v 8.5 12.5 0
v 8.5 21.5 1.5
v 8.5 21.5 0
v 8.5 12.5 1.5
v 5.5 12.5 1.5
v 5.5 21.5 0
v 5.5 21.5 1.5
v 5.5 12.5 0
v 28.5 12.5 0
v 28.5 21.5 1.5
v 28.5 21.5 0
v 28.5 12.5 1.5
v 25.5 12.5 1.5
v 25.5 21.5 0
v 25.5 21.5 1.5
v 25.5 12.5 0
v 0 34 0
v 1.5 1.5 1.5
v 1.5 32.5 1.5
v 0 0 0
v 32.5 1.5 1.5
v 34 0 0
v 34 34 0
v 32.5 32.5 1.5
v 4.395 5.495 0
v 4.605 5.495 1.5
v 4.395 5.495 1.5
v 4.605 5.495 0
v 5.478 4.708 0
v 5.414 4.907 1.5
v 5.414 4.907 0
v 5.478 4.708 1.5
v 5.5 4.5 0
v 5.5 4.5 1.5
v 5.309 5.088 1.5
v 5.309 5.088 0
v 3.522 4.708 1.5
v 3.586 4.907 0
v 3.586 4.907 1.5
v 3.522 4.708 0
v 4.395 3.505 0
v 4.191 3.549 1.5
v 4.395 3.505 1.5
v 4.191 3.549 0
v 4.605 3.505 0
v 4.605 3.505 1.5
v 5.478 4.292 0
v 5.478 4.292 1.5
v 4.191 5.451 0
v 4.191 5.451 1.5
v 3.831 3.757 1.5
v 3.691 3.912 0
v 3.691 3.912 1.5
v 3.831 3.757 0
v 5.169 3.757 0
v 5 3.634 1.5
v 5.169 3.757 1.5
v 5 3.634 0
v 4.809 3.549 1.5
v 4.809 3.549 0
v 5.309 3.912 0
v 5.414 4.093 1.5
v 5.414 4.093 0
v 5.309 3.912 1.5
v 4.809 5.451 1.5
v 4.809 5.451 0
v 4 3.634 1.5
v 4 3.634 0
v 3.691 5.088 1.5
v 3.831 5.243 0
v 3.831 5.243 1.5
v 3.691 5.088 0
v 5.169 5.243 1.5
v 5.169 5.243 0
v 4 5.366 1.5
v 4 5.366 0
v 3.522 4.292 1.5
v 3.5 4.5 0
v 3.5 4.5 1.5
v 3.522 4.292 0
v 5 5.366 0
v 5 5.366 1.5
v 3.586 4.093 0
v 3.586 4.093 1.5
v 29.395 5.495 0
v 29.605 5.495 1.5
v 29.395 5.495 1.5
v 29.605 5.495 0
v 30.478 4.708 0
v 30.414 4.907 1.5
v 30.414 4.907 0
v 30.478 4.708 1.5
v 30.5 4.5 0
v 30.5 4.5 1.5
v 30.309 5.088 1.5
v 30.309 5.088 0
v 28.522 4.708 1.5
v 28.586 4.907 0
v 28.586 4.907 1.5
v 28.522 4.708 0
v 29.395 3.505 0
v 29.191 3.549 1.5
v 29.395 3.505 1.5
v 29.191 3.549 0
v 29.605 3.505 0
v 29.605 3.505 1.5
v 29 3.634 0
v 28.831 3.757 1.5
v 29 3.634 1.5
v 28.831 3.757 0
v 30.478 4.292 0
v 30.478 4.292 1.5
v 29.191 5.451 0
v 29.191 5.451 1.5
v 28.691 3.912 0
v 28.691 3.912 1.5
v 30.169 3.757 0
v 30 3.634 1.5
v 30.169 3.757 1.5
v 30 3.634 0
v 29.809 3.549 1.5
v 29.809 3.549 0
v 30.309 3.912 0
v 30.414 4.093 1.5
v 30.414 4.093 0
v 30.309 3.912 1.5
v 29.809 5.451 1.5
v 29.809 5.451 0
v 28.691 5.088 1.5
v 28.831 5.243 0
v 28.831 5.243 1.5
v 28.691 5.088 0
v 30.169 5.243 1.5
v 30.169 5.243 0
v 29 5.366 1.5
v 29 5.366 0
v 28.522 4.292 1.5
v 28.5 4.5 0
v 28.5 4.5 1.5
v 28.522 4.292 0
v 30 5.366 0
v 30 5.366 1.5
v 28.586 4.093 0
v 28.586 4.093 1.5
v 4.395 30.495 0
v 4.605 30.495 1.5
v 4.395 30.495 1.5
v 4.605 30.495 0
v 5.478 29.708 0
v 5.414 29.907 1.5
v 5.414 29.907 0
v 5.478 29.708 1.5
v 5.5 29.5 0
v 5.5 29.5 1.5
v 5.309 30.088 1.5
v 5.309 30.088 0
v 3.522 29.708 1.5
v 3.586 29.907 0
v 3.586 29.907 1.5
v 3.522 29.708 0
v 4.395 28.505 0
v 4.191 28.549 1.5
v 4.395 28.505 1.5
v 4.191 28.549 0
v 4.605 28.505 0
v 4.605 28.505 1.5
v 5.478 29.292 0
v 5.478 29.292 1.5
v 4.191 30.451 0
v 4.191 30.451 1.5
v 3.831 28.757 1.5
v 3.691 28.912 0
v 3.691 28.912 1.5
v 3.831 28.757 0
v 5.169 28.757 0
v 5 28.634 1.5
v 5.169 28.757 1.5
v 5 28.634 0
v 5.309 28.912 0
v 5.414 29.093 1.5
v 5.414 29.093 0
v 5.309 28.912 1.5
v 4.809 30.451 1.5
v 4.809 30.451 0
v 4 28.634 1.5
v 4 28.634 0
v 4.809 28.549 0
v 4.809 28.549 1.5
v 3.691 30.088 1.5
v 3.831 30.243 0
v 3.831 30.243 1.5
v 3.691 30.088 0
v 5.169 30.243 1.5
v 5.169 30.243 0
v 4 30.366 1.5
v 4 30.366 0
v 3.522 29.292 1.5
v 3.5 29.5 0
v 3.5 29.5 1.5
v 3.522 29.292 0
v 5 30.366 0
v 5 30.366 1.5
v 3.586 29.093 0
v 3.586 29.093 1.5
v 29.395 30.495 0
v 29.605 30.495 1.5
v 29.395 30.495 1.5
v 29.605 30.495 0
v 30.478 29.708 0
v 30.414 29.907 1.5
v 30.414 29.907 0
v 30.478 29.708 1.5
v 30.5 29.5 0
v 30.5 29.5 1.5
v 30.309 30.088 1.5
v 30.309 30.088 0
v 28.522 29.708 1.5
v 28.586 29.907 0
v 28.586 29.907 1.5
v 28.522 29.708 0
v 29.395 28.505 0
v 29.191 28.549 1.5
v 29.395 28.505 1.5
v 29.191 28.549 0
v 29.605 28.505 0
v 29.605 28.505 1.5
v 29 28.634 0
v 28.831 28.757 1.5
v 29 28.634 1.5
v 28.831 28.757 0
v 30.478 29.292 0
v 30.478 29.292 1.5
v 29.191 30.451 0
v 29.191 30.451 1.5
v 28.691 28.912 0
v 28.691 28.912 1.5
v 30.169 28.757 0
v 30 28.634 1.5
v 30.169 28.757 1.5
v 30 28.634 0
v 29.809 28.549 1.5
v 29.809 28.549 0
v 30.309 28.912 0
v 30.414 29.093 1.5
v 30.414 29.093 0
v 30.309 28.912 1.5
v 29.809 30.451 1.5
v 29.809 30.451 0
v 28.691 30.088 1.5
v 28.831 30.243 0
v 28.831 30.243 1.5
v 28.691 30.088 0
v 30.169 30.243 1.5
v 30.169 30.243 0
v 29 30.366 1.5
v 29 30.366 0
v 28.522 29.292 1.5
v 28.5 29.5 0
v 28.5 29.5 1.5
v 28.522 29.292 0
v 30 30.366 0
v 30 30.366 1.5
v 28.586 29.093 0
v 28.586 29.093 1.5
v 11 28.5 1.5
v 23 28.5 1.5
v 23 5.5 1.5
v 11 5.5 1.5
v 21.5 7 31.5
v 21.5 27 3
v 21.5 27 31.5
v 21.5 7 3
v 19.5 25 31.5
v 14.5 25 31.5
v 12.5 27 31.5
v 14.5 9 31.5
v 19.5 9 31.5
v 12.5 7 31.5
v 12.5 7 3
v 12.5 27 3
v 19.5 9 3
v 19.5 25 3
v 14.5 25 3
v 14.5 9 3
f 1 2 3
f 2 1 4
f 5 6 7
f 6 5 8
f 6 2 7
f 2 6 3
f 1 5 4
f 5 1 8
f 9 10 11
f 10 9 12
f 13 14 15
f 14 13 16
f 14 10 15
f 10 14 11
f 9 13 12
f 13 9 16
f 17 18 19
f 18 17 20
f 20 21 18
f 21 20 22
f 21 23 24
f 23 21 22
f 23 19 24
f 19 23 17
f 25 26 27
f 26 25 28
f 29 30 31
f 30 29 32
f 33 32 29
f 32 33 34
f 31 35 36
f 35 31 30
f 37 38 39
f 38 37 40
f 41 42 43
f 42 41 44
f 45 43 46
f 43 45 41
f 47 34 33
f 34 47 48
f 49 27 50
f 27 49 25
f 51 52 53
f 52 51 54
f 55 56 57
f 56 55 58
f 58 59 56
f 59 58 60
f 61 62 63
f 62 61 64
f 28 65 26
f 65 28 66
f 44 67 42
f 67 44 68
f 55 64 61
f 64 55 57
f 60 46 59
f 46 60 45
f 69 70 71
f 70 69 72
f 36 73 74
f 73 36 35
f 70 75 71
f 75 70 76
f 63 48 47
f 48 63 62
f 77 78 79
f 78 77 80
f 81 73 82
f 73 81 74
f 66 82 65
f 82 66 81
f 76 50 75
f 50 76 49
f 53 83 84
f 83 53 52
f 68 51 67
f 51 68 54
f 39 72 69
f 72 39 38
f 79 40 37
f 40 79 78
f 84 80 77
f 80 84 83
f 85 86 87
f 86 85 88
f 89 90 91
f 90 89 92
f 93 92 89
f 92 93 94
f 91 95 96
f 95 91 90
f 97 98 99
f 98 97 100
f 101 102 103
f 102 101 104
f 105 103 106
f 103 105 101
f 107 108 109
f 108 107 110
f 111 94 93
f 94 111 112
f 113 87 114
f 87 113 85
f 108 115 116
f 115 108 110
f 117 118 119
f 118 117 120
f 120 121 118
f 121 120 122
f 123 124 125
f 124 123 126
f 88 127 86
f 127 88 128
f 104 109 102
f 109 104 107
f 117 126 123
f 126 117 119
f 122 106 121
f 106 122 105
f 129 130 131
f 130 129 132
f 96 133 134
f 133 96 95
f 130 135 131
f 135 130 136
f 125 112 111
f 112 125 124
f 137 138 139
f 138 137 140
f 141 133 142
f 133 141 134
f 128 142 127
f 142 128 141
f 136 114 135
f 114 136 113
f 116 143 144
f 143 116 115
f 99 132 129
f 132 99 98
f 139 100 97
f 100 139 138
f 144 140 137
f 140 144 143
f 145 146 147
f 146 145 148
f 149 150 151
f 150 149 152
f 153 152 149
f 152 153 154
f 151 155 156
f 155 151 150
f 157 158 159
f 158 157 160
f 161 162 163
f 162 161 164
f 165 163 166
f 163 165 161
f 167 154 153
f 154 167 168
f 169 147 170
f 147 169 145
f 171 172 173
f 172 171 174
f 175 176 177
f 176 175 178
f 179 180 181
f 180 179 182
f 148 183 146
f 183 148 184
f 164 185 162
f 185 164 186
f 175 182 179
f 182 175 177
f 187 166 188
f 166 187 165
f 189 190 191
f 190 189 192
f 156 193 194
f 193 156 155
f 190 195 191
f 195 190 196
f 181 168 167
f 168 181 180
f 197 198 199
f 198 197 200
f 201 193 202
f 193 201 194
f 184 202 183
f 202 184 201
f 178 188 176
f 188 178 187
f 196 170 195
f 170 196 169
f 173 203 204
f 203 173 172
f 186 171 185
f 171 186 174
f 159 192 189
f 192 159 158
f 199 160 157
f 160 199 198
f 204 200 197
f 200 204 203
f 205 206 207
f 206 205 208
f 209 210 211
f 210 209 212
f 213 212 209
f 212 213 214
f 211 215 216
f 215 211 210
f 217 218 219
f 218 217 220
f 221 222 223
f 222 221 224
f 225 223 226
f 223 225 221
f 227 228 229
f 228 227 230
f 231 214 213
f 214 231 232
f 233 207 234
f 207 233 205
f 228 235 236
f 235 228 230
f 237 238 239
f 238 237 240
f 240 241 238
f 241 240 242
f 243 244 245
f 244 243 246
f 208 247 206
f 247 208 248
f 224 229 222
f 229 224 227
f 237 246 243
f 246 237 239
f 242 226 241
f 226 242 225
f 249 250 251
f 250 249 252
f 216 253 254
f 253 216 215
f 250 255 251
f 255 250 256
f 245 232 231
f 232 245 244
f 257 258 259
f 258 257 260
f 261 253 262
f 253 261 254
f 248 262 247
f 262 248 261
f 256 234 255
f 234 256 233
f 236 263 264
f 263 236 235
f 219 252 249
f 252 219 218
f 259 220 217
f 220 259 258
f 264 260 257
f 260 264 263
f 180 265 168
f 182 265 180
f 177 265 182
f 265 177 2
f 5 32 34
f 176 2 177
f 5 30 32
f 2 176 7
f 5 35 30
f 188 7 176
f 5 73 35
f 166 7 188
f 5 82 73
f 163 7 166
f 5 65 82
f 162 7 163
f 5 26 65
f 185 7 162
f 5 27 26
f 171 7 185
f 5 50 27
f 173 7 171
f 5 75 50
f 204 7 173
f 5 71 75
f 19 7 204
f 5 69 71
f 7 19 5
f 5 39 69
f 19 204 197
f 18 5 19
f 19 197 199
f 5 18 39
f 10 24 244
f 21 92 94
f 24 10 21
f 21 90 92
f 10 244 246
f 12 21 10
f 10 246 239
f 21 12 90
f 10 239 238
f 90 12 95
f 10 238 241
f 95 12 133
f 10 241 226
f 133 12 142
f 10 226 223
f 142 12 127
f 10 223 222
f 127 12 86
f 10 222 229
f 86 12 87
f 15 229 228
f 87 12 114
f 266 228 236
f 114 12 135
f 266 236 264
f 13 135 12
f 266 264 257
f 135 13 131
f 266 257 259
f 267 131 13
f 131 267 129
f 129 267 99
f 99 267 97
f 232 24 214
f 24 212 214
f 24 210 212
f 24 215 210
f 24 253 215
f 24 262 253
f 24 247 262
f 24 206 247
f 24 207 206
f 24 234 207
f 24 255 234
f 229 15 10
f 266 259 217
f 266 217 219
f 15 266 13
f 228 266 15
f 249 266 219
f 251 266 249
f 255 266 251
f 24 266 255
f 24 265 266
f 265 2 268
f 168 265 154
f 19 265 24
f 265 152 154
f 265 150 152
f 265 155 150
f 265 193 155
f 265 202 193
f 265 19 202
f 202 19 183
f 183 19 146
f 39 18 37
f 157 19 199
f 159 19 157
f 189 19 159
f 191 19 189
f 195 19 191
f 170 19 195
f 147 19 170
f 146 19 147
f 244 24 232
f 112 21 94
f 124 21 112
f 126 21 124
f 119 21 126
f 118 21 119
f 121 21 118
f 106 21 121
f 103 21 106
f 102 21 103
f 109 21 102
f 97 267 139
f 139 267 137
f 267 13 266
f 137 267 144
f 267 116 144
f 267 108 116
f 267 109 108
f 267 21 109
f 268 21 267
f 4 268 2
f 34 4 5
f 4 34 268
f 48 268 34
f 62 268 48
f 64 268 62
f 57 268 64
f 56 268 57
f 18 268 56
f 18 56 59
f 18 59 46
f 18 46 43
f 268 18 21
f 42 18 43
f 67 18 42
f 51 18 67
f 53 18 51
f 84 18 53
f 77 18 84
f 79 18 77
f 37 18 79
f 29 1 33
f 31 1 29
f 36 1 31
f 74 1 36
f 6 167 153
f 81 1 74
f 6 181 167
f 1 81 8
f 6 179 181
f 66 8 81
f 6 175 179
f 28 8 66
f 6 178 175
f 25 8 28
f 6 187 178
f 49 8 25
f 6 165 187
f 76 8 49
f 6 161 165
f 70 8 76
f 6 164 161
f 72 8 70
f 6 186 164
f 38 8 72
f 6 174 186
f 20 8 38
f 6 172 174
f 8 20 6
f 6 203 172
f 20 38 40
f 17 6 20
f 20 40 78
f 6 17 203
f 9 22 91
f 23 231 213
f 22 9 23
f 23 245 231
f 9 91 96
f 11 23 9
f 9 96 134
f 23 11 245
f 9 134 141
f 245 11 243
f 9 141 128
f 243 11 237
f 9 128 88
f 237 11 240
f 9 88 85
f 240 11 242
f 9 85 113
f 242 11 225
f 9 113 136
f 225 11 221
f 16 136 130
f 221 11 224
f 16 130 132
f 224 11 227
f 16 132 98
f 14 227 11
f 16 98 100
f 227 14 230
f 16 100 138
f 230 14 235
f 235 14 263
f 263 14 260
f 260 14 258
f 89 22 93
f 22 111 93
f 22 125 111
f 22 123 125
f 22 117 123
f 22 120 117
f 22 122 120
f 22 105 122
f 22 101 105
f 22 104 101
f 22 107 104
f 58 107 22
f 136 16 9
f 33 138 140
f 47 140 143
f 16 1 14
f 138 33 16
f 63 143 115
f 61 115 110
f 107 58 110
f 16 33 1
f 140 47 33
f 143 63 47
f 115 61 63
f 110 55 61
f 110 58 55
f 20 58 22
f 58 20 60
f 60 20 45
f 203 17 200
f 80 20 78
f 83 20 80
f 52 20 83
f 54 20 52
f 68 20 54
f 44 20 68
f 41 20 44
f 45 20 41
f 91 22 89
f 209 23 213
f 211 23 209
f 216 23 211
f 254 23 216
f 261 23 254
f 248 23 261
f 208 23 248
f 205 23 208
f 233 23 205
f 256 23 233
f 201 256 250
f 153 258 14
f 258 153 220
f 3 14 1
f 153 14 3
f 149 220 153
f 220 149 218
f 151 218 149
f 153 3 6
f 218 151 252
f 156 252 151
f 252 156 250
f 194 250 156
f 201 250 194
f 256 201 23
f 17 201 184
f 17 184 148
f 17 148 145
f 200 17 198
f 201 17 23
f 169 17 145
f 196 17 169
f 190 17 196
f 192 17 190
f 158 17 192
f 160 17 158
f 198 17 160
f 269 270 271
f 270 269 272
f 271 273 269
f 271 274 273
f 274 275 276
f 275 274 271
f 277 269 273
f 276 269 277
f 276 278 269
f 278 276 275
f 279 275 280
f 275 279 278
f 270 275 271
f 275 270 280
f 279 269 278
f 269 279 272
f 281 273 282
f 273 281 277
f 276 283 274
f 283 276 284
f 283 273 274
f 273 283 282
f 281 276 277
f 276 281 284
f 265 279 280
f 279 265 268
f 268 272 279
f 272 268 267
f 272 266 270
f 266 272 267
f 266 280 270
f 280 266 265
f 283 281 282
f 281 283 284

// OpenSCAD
// title      : RoboGen parametric A part
// author     : Alice Concordel

partA(0.03,0); //the first parameter is the length of the joint, the second parameter is the angle beta (only for non-planar robots)

module partA(length, beta)
{
//plate parameters
	lengthSlide = 34;
	widthSlide = 34;
	heightSlide = 1.5;

	radiusHole = 1;

//wire hole parameters
	lengthWire = 3;
	widthWire = 9;
	heightWire = heightSlide;

//shaft part parameters
	lengthShaft = 20;
	widthShaft = 9;

// apply transformations to the parameter
length = length*1000; //convert to mm
	union()
	{
		difference()
		{
			// starting plate
			cube([lengthSlide,widthSlide,heightSlide]);
		
			union()
			{
			// chamfer the edges
				rotate ([0,-45,0]) cube([3,widthSlide,3]);
				rotate([45,0,0]) cube([lengthSlide,3,3]);
				translate([lengthSlide,0,0]) rotate([0,-45,0]) cube([3,widthSlide,3]);
				translate([0,widthSlide,0]) rotate([45,0,0]) cube([lengthSlide,3,3]);

			// holes in the plate
					//round
				translate([4.5,4.5,-0.5]) cylinder(r = radiusHole, h = heightSlide+1, $fn = 30);
				translate([lengthSlide-4.5,4.5,-0.5]) cylinder(r = radiusHole, h = heightSlide+1, $fn = 30);
				translate([4.5,widthSlide-4.5,-0.5]) cylinder(r = radiusHole, h = heightSlide+1, $fn = 30);
				translate([lengthSlide-4.5,widthSlide-4.5,-0.5]) cylinder(r = radiusHole, h = heightSlide+1, $fn = 30);
					
					//rectangular holes (only present if the shaft is not rotated)
				if(beta == 0){
				translate([7-lengthWire/2,widthSlide/2-widthWire/2,-0.5]) cube([lengthWire,widthWire,heightSlide+1]);
				translate([lengthSlide-7-lengthWire/2,widthSlide/2-widthWire/2,-0.5]) cube([lengthWire,widthWire,heightSlide+1]);
				}
			}
		}

	//the shaft
		//========================== beta paramter below: rotates the whole thing if needed
		translate([lengthSlide/2,widthSlide/2,0]) rotate([0,0,beta]) translate([-lengthSlide/2,-widthSlide/2,0]) 
	union()
	{
		//main long part 
		//========================== length parameter below
			difference()
			{
			translate([lengthSlide/2-widthShaft/2,widthSlide/2-lengthShaft/2,0]) cube([widthShaft,lengthShaft,length+heightSlide]);
			translate([lengthSlide/2-(widthShaft-4)/2,widthSlide/2-(lengthShaft-4)/2,heightSlide]) cube([widthShaft-4,lengthShaft-4,length+0.5]);
			}

		//chamfer the edges of the shaft base
			difference()
			{
				translate([lengthSlide/2-(widthShaft+3)/2,widthSlide/2-(lengthShaft+3)/2]) cube([widthShaft+3,lengthShaft+3,3]);
				union()
				{
				translate([lengthSlide/2-widthShaft/2-1.5,0,1.5]) rotate ([0,-45,0]) cube([1.5*sqrt(2),widthSlide,1.5*sqrt(2)]);
				translate([0,widthSlide/2-lengthShaft/2-1.5,1.5]) rotate([45,0,0]) cube([lengthSlide,1.5*sqrt(2),1.5*sqrt(2)]);
				translate([lengthSlide/2+widthShaft/2+1.5,0,1.5]) rotate([0,-45,0]) cube([1.5*sqrt(2),widthSlide,1.5*sqrt(2)]);
				translate([0,widthSlide/2+lengthShaft/2+1.5,1.5]) rotate([45,0,0]) cube([lengthSlide,1.5*sqrt(2),1.5*sqrt(2)]);
				}
			}
		}
	}
}
